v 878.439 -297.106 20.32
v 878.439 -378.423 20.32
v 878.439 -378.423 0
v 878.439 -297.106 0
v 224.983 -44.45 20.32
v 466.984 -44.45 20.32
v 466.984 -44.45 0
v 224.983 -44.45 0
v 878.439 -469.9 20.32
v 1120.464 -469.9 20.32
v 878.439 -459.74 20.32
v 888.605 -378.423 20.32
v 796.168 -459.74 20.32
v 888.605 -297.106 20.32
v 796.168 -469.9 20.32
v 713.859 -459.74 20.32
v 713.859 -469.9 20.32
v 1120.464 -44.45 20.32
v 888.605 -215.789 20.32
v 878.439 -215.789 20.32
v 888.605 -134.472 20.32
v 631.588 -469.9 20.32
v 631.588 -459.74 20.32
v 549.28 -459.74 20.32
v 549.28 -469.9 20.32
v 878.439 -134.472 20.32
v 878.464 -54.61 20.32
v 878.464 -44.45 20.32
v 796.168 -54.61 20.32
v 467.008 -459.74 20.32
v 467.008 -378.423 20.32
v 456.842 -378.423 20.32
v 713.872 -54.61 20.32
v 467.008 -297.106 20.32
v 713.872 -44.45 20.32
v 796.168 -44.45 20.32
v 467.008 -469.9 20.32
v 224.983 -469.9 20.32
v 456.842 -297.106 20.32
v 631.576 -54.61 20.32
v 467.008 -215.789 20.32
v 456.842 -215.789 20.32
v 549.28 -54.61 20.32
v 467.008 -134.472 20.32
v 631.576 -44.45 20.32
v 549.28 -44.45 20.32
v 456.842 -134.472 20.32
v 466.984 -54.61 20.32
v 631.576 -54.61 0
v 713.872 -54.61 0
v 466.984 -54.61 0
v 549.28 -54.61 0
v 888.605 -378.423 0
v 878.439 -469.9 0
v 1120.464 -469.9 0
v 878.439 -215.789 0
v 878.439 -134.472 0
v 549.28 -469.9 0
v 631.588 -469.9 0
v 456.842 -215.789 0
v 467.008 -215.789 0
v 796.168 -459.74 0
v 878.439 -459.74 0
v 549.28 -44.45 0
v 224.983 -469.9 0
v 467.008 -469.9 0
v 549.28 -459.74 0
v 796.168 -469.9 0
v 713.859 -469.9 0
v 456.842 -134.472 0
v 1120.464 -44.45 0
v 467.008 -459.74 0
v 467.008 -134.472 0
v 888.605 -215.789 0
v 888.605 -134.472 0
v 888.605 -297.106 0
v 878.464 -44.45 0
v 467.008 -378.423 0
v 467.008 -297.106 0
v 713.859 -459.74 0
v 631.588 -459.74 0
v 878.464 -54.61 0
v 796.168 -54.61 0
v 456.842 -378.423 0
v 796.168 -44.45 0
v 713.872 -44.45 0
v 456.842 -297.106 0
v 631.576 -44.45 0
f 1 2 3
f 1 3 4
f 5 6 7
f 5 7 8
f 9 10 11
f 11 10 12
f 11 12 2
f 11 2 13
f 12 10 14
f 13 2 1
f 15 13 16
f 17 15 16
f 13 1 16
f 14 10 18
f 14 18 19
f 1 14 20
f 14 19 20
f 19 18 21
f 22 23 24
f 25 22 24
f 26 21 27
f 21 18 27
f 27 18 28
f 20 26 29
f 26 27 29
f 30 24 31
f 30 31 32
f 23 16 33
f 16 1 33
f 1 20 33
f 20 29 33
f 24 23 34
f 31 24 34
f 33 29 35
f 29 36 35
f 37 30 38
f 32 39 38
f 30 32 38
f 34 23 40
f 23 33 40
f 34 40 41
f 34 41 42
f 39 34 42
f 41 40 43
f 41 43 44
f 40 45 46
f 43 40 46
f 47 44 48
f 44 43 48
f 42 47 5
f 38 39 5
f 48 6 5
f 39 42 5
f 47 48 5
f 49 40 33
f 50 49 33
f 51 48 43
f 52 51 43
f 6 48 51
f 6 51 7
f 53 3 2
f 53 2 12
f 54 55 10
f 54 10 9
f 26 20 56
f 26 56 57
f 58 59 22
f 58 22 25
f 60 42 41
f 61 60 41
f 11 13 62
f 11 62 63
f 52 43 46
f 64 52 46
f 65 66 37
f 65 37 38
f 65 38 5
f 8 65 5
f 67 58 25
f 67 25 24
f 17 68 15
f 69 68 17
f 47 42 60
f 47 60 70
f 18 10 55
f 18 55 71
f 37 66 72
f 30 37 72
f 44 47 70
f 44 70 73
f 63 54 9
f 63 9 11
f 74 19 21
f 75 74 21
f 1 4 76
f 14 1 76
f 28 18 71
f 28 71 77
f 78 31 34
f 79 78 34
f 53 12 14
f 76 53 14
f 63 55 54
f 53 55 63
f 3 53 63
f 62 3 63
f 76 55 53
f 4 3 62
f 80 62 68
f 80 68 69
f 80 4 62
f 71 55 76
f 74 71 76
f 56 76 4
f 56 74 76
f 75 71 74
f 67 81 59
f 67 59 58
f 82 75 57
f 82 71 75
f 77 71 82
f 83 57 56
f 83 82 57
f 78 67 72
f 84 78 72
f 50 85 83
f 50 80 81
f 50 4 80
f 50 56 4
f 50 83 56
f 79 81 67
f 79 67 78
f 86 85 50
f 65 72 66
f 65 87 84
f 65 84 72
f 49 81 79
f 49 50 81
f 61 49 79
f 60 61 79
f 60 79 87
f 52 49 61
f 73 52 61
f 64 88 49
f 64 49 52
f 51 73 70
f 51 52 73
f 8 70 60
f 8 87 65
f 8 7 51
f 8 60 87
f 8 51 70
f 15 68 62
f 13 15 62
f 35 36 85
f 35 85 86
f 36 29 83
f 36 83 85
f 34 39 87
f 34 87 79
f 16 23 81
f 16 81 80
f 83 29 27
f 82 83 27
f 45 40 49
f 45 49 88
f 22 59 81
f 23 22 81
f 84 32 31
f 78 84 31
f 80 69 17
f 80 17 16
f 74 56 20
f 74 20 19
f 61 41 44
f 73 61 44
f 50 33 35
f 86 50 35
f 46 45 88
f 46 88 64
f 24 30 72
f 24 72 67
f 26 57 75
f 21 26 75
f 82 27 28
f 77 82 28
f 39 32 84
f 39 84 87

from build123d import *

# Parameters (mm, degrees)
BOSS_EXTRUDE1_DEPTH = 20.32
SKETCH2_W           = 10.166490401
SKETCH2_H           = 81.316938585
SKETCH2_W_2         = 10.166490402
SKETCH2_H_2         = 81.316938584
SKETCH2_W_3         = 82.271298803
SKETCH2_H_3         = 10.16
CUT_EXTRUDE2_DEPTH  = 137.414
CUT_EXTRUDE3_DEPTH  = 1426.288377921
SKETCH5_W           = 82.296
SKETCH5_H           = 10.16
CUT_EXTRUDE4_DEPTH  = 1408.889980636
CUT_EXTRUDE5_DEPTH  = 1408.889980636
SKETCH7_W           = 370.520147136
SKETCH7_H           = 597.78628448
SKETCH7_W_2         = 231.394598612
SKETCH7_H_2         = 493.59842382
CUT_EXTRUDE6_DEPTH  = 25.4


with BuildPart() as part:
    # Sketch1 → Boss-Extrude1 (new body)
    with BuildSketch(Plane.XY):
        with BuildLine():
            Line((0, 0), (1345.447057269, 0))
            Line((1345.447057269, 0), (1156.937235756, -454.288839135))
            add(Edge.make_bspline(
                [(1156.937235756, -454.288839135), (1155.965204773, -456.631331547), (1154.630956054, -458.816896883), (1152.225947859, -461.69350105), (1151.355065983, -462.590813772), (1149.473312624, -464.260936999), (1148.45987476, -465.033112958), (1146.360299176, -466.401155283), (1145.26635201, -467.004685932), (1142.990856866, -468.052074807), (1141.798989191, -468.498505895), (1138.174492983, -469.560599459), (1135.699262078, -469.911644948), (1133.16419506, -469.9)],
                knots=[0, 0, 0, 0, 0.25, 0.25, 0.375, 0.375, 0.5, 0.5, 0.625, 0.625, 0.75, 0.75, 1, 1, 1, 1], degree=3))
            Line((1133.16419506, -469.9), (212.282862208, -469.9))
            add(Edge.make_bspline(
                [(188.509821513, -454.288839135), (189.481852496, -456.631331547), (190.816101215, -458.816896883), (193.22110941, -461.69350105), (194.091991286, -462.590813772), (195.973744645, -464.260936999), (196.987182509, -465.033112958), (199.086758093, -466.401155283), (200.180705259, -467.004685932), (202.456200403, -468.052074807), (203.648068078, -468.498505895), (207.272564286, -469.560599459), (209.747795191, -469.911644948), (212.282862208, -469.9)],
                knots=[0, 0, 0, 0, 0.25, 0.25, 0.375, 0.375, 0.5, 0.5, 0.625, 0.625, 0.75, 0.75, 1, 1, 1, 1], degree=3))
            Line((188.509821513, -454.288839135), (0, 0))
        make_face()
    extrude(amount=BOSS_EXTRUDE1_DEPTH)

    # Sketch2 → Cut-Extrude2 (cut)
    with BuildSketch(Plane.XY.offset(20.32)):
        with Locations((461.924984631, -337.764592123)):
            Rectangle(SKETCH2_W, SKETCH2_H)
        with Locations((883.522072638, -337.764592123)):
            Rectangle(SKETCH2_W_2, SKETCH2_H)
        with Locations((883.522072638, -175.130714953)):
            Rectangle(SKETCH2_W_2, SKETCH2_H_2)
        with Locations((461.924984631, -175.130714953)):
            Rectangle(SKETCH2_W, SKETCH2_H_2)
        with Locations((837.303178036, -464.82)):
            Rectangle(SKETCH2_W_3, SKETCH2_H_3)
        with Locations((672.723528635, -464.82)):
            Rectangle(SKETCH2_W_3, SKETCH2_H_3)
        with Locations((508.143879233, -464.82)):
            Rectangle(SKETCH2_W_3, SKETCH2_H_3)
    extrude(amount=-CUT_EXTRUDE2_DEPTH, mode=Mode.SUBTRACT)

    # Sketch4 → Cut-Extrude3 (cut, through all)
    with BuildSketch(Plane.XY.offset(20.32)):
        Polygon((0, 0), (1345.447057269, 0), (1327.002268746, -44.45), (18.444788523, -44.45), align=None)
    extrude(amount=-CUT_EXTRUDE3_DEPTH, mode=Mode.SUBTRACT)

    # Sketch5 → Cut-Extrude4 (cut, through all)
    with BuildSketch(Plane.XY.offset(20.32)):
        with Locations((508.131528634, -49.53)):
            Rectangle(SKETCH5_W, SKETCH5_H)
        with Locations((672.723528634, -49.53)):
            Rectangle(SKETCH5_W, SKETCH5_H)
        with Locations((837.315528634, -49.53)):
            Rectangle(SKETCH5_W, SKETCH5_H)
    extrude(amount=-CUT_EXTRUDE4_DEPTH, mode=Mode.SUBTRACT)

    # Sketch6 → Cut-Extrude5 (cut, through all)
    with BuildSketch(Plane.XY.offset(20.32)):
        Polygon((192.807539001, -448.077869782), (224.982862208, -469.9), (232.080223429, -549.766419732), (-59.510742861, -242.335130221), (-120.238907144, 37.382474964), (56.544788523, -44.45), (56.544788523, -119.698975594), align=None)
        Polygon((1120.46419506, -469.9), (1113.36683384, -549.766419732), (1404.95780013, -242.335130221), (1465.685964413, 37.382474964), (1288.902268746, -44.45), (1288.902268746, -119.698975594), (1152.639518267, -448.077869782), align=None)
    extrude(amount=-CUT_EXTRUDE5_DEPTH, mode=Mode.SUBTRACT)

    # Sketch7 → Cut-Extrude6 (cut)
    with BuildSketch(Plane.XY.offset(20.32)):
        with Locations((39.72278864, -171.00685776)):
            Rectangle(SKETCH7_W, SKETCH7_H)
        with Locations((1236.161494366, -223.10078809)):
            Rectangle(SKETCH7_W_2, SKETCH7_H_2)
    extrude(amount=-CUT_EXTRUDE6_DEPTH, mode=Mode.SUBTRACT)


solid = part.part
